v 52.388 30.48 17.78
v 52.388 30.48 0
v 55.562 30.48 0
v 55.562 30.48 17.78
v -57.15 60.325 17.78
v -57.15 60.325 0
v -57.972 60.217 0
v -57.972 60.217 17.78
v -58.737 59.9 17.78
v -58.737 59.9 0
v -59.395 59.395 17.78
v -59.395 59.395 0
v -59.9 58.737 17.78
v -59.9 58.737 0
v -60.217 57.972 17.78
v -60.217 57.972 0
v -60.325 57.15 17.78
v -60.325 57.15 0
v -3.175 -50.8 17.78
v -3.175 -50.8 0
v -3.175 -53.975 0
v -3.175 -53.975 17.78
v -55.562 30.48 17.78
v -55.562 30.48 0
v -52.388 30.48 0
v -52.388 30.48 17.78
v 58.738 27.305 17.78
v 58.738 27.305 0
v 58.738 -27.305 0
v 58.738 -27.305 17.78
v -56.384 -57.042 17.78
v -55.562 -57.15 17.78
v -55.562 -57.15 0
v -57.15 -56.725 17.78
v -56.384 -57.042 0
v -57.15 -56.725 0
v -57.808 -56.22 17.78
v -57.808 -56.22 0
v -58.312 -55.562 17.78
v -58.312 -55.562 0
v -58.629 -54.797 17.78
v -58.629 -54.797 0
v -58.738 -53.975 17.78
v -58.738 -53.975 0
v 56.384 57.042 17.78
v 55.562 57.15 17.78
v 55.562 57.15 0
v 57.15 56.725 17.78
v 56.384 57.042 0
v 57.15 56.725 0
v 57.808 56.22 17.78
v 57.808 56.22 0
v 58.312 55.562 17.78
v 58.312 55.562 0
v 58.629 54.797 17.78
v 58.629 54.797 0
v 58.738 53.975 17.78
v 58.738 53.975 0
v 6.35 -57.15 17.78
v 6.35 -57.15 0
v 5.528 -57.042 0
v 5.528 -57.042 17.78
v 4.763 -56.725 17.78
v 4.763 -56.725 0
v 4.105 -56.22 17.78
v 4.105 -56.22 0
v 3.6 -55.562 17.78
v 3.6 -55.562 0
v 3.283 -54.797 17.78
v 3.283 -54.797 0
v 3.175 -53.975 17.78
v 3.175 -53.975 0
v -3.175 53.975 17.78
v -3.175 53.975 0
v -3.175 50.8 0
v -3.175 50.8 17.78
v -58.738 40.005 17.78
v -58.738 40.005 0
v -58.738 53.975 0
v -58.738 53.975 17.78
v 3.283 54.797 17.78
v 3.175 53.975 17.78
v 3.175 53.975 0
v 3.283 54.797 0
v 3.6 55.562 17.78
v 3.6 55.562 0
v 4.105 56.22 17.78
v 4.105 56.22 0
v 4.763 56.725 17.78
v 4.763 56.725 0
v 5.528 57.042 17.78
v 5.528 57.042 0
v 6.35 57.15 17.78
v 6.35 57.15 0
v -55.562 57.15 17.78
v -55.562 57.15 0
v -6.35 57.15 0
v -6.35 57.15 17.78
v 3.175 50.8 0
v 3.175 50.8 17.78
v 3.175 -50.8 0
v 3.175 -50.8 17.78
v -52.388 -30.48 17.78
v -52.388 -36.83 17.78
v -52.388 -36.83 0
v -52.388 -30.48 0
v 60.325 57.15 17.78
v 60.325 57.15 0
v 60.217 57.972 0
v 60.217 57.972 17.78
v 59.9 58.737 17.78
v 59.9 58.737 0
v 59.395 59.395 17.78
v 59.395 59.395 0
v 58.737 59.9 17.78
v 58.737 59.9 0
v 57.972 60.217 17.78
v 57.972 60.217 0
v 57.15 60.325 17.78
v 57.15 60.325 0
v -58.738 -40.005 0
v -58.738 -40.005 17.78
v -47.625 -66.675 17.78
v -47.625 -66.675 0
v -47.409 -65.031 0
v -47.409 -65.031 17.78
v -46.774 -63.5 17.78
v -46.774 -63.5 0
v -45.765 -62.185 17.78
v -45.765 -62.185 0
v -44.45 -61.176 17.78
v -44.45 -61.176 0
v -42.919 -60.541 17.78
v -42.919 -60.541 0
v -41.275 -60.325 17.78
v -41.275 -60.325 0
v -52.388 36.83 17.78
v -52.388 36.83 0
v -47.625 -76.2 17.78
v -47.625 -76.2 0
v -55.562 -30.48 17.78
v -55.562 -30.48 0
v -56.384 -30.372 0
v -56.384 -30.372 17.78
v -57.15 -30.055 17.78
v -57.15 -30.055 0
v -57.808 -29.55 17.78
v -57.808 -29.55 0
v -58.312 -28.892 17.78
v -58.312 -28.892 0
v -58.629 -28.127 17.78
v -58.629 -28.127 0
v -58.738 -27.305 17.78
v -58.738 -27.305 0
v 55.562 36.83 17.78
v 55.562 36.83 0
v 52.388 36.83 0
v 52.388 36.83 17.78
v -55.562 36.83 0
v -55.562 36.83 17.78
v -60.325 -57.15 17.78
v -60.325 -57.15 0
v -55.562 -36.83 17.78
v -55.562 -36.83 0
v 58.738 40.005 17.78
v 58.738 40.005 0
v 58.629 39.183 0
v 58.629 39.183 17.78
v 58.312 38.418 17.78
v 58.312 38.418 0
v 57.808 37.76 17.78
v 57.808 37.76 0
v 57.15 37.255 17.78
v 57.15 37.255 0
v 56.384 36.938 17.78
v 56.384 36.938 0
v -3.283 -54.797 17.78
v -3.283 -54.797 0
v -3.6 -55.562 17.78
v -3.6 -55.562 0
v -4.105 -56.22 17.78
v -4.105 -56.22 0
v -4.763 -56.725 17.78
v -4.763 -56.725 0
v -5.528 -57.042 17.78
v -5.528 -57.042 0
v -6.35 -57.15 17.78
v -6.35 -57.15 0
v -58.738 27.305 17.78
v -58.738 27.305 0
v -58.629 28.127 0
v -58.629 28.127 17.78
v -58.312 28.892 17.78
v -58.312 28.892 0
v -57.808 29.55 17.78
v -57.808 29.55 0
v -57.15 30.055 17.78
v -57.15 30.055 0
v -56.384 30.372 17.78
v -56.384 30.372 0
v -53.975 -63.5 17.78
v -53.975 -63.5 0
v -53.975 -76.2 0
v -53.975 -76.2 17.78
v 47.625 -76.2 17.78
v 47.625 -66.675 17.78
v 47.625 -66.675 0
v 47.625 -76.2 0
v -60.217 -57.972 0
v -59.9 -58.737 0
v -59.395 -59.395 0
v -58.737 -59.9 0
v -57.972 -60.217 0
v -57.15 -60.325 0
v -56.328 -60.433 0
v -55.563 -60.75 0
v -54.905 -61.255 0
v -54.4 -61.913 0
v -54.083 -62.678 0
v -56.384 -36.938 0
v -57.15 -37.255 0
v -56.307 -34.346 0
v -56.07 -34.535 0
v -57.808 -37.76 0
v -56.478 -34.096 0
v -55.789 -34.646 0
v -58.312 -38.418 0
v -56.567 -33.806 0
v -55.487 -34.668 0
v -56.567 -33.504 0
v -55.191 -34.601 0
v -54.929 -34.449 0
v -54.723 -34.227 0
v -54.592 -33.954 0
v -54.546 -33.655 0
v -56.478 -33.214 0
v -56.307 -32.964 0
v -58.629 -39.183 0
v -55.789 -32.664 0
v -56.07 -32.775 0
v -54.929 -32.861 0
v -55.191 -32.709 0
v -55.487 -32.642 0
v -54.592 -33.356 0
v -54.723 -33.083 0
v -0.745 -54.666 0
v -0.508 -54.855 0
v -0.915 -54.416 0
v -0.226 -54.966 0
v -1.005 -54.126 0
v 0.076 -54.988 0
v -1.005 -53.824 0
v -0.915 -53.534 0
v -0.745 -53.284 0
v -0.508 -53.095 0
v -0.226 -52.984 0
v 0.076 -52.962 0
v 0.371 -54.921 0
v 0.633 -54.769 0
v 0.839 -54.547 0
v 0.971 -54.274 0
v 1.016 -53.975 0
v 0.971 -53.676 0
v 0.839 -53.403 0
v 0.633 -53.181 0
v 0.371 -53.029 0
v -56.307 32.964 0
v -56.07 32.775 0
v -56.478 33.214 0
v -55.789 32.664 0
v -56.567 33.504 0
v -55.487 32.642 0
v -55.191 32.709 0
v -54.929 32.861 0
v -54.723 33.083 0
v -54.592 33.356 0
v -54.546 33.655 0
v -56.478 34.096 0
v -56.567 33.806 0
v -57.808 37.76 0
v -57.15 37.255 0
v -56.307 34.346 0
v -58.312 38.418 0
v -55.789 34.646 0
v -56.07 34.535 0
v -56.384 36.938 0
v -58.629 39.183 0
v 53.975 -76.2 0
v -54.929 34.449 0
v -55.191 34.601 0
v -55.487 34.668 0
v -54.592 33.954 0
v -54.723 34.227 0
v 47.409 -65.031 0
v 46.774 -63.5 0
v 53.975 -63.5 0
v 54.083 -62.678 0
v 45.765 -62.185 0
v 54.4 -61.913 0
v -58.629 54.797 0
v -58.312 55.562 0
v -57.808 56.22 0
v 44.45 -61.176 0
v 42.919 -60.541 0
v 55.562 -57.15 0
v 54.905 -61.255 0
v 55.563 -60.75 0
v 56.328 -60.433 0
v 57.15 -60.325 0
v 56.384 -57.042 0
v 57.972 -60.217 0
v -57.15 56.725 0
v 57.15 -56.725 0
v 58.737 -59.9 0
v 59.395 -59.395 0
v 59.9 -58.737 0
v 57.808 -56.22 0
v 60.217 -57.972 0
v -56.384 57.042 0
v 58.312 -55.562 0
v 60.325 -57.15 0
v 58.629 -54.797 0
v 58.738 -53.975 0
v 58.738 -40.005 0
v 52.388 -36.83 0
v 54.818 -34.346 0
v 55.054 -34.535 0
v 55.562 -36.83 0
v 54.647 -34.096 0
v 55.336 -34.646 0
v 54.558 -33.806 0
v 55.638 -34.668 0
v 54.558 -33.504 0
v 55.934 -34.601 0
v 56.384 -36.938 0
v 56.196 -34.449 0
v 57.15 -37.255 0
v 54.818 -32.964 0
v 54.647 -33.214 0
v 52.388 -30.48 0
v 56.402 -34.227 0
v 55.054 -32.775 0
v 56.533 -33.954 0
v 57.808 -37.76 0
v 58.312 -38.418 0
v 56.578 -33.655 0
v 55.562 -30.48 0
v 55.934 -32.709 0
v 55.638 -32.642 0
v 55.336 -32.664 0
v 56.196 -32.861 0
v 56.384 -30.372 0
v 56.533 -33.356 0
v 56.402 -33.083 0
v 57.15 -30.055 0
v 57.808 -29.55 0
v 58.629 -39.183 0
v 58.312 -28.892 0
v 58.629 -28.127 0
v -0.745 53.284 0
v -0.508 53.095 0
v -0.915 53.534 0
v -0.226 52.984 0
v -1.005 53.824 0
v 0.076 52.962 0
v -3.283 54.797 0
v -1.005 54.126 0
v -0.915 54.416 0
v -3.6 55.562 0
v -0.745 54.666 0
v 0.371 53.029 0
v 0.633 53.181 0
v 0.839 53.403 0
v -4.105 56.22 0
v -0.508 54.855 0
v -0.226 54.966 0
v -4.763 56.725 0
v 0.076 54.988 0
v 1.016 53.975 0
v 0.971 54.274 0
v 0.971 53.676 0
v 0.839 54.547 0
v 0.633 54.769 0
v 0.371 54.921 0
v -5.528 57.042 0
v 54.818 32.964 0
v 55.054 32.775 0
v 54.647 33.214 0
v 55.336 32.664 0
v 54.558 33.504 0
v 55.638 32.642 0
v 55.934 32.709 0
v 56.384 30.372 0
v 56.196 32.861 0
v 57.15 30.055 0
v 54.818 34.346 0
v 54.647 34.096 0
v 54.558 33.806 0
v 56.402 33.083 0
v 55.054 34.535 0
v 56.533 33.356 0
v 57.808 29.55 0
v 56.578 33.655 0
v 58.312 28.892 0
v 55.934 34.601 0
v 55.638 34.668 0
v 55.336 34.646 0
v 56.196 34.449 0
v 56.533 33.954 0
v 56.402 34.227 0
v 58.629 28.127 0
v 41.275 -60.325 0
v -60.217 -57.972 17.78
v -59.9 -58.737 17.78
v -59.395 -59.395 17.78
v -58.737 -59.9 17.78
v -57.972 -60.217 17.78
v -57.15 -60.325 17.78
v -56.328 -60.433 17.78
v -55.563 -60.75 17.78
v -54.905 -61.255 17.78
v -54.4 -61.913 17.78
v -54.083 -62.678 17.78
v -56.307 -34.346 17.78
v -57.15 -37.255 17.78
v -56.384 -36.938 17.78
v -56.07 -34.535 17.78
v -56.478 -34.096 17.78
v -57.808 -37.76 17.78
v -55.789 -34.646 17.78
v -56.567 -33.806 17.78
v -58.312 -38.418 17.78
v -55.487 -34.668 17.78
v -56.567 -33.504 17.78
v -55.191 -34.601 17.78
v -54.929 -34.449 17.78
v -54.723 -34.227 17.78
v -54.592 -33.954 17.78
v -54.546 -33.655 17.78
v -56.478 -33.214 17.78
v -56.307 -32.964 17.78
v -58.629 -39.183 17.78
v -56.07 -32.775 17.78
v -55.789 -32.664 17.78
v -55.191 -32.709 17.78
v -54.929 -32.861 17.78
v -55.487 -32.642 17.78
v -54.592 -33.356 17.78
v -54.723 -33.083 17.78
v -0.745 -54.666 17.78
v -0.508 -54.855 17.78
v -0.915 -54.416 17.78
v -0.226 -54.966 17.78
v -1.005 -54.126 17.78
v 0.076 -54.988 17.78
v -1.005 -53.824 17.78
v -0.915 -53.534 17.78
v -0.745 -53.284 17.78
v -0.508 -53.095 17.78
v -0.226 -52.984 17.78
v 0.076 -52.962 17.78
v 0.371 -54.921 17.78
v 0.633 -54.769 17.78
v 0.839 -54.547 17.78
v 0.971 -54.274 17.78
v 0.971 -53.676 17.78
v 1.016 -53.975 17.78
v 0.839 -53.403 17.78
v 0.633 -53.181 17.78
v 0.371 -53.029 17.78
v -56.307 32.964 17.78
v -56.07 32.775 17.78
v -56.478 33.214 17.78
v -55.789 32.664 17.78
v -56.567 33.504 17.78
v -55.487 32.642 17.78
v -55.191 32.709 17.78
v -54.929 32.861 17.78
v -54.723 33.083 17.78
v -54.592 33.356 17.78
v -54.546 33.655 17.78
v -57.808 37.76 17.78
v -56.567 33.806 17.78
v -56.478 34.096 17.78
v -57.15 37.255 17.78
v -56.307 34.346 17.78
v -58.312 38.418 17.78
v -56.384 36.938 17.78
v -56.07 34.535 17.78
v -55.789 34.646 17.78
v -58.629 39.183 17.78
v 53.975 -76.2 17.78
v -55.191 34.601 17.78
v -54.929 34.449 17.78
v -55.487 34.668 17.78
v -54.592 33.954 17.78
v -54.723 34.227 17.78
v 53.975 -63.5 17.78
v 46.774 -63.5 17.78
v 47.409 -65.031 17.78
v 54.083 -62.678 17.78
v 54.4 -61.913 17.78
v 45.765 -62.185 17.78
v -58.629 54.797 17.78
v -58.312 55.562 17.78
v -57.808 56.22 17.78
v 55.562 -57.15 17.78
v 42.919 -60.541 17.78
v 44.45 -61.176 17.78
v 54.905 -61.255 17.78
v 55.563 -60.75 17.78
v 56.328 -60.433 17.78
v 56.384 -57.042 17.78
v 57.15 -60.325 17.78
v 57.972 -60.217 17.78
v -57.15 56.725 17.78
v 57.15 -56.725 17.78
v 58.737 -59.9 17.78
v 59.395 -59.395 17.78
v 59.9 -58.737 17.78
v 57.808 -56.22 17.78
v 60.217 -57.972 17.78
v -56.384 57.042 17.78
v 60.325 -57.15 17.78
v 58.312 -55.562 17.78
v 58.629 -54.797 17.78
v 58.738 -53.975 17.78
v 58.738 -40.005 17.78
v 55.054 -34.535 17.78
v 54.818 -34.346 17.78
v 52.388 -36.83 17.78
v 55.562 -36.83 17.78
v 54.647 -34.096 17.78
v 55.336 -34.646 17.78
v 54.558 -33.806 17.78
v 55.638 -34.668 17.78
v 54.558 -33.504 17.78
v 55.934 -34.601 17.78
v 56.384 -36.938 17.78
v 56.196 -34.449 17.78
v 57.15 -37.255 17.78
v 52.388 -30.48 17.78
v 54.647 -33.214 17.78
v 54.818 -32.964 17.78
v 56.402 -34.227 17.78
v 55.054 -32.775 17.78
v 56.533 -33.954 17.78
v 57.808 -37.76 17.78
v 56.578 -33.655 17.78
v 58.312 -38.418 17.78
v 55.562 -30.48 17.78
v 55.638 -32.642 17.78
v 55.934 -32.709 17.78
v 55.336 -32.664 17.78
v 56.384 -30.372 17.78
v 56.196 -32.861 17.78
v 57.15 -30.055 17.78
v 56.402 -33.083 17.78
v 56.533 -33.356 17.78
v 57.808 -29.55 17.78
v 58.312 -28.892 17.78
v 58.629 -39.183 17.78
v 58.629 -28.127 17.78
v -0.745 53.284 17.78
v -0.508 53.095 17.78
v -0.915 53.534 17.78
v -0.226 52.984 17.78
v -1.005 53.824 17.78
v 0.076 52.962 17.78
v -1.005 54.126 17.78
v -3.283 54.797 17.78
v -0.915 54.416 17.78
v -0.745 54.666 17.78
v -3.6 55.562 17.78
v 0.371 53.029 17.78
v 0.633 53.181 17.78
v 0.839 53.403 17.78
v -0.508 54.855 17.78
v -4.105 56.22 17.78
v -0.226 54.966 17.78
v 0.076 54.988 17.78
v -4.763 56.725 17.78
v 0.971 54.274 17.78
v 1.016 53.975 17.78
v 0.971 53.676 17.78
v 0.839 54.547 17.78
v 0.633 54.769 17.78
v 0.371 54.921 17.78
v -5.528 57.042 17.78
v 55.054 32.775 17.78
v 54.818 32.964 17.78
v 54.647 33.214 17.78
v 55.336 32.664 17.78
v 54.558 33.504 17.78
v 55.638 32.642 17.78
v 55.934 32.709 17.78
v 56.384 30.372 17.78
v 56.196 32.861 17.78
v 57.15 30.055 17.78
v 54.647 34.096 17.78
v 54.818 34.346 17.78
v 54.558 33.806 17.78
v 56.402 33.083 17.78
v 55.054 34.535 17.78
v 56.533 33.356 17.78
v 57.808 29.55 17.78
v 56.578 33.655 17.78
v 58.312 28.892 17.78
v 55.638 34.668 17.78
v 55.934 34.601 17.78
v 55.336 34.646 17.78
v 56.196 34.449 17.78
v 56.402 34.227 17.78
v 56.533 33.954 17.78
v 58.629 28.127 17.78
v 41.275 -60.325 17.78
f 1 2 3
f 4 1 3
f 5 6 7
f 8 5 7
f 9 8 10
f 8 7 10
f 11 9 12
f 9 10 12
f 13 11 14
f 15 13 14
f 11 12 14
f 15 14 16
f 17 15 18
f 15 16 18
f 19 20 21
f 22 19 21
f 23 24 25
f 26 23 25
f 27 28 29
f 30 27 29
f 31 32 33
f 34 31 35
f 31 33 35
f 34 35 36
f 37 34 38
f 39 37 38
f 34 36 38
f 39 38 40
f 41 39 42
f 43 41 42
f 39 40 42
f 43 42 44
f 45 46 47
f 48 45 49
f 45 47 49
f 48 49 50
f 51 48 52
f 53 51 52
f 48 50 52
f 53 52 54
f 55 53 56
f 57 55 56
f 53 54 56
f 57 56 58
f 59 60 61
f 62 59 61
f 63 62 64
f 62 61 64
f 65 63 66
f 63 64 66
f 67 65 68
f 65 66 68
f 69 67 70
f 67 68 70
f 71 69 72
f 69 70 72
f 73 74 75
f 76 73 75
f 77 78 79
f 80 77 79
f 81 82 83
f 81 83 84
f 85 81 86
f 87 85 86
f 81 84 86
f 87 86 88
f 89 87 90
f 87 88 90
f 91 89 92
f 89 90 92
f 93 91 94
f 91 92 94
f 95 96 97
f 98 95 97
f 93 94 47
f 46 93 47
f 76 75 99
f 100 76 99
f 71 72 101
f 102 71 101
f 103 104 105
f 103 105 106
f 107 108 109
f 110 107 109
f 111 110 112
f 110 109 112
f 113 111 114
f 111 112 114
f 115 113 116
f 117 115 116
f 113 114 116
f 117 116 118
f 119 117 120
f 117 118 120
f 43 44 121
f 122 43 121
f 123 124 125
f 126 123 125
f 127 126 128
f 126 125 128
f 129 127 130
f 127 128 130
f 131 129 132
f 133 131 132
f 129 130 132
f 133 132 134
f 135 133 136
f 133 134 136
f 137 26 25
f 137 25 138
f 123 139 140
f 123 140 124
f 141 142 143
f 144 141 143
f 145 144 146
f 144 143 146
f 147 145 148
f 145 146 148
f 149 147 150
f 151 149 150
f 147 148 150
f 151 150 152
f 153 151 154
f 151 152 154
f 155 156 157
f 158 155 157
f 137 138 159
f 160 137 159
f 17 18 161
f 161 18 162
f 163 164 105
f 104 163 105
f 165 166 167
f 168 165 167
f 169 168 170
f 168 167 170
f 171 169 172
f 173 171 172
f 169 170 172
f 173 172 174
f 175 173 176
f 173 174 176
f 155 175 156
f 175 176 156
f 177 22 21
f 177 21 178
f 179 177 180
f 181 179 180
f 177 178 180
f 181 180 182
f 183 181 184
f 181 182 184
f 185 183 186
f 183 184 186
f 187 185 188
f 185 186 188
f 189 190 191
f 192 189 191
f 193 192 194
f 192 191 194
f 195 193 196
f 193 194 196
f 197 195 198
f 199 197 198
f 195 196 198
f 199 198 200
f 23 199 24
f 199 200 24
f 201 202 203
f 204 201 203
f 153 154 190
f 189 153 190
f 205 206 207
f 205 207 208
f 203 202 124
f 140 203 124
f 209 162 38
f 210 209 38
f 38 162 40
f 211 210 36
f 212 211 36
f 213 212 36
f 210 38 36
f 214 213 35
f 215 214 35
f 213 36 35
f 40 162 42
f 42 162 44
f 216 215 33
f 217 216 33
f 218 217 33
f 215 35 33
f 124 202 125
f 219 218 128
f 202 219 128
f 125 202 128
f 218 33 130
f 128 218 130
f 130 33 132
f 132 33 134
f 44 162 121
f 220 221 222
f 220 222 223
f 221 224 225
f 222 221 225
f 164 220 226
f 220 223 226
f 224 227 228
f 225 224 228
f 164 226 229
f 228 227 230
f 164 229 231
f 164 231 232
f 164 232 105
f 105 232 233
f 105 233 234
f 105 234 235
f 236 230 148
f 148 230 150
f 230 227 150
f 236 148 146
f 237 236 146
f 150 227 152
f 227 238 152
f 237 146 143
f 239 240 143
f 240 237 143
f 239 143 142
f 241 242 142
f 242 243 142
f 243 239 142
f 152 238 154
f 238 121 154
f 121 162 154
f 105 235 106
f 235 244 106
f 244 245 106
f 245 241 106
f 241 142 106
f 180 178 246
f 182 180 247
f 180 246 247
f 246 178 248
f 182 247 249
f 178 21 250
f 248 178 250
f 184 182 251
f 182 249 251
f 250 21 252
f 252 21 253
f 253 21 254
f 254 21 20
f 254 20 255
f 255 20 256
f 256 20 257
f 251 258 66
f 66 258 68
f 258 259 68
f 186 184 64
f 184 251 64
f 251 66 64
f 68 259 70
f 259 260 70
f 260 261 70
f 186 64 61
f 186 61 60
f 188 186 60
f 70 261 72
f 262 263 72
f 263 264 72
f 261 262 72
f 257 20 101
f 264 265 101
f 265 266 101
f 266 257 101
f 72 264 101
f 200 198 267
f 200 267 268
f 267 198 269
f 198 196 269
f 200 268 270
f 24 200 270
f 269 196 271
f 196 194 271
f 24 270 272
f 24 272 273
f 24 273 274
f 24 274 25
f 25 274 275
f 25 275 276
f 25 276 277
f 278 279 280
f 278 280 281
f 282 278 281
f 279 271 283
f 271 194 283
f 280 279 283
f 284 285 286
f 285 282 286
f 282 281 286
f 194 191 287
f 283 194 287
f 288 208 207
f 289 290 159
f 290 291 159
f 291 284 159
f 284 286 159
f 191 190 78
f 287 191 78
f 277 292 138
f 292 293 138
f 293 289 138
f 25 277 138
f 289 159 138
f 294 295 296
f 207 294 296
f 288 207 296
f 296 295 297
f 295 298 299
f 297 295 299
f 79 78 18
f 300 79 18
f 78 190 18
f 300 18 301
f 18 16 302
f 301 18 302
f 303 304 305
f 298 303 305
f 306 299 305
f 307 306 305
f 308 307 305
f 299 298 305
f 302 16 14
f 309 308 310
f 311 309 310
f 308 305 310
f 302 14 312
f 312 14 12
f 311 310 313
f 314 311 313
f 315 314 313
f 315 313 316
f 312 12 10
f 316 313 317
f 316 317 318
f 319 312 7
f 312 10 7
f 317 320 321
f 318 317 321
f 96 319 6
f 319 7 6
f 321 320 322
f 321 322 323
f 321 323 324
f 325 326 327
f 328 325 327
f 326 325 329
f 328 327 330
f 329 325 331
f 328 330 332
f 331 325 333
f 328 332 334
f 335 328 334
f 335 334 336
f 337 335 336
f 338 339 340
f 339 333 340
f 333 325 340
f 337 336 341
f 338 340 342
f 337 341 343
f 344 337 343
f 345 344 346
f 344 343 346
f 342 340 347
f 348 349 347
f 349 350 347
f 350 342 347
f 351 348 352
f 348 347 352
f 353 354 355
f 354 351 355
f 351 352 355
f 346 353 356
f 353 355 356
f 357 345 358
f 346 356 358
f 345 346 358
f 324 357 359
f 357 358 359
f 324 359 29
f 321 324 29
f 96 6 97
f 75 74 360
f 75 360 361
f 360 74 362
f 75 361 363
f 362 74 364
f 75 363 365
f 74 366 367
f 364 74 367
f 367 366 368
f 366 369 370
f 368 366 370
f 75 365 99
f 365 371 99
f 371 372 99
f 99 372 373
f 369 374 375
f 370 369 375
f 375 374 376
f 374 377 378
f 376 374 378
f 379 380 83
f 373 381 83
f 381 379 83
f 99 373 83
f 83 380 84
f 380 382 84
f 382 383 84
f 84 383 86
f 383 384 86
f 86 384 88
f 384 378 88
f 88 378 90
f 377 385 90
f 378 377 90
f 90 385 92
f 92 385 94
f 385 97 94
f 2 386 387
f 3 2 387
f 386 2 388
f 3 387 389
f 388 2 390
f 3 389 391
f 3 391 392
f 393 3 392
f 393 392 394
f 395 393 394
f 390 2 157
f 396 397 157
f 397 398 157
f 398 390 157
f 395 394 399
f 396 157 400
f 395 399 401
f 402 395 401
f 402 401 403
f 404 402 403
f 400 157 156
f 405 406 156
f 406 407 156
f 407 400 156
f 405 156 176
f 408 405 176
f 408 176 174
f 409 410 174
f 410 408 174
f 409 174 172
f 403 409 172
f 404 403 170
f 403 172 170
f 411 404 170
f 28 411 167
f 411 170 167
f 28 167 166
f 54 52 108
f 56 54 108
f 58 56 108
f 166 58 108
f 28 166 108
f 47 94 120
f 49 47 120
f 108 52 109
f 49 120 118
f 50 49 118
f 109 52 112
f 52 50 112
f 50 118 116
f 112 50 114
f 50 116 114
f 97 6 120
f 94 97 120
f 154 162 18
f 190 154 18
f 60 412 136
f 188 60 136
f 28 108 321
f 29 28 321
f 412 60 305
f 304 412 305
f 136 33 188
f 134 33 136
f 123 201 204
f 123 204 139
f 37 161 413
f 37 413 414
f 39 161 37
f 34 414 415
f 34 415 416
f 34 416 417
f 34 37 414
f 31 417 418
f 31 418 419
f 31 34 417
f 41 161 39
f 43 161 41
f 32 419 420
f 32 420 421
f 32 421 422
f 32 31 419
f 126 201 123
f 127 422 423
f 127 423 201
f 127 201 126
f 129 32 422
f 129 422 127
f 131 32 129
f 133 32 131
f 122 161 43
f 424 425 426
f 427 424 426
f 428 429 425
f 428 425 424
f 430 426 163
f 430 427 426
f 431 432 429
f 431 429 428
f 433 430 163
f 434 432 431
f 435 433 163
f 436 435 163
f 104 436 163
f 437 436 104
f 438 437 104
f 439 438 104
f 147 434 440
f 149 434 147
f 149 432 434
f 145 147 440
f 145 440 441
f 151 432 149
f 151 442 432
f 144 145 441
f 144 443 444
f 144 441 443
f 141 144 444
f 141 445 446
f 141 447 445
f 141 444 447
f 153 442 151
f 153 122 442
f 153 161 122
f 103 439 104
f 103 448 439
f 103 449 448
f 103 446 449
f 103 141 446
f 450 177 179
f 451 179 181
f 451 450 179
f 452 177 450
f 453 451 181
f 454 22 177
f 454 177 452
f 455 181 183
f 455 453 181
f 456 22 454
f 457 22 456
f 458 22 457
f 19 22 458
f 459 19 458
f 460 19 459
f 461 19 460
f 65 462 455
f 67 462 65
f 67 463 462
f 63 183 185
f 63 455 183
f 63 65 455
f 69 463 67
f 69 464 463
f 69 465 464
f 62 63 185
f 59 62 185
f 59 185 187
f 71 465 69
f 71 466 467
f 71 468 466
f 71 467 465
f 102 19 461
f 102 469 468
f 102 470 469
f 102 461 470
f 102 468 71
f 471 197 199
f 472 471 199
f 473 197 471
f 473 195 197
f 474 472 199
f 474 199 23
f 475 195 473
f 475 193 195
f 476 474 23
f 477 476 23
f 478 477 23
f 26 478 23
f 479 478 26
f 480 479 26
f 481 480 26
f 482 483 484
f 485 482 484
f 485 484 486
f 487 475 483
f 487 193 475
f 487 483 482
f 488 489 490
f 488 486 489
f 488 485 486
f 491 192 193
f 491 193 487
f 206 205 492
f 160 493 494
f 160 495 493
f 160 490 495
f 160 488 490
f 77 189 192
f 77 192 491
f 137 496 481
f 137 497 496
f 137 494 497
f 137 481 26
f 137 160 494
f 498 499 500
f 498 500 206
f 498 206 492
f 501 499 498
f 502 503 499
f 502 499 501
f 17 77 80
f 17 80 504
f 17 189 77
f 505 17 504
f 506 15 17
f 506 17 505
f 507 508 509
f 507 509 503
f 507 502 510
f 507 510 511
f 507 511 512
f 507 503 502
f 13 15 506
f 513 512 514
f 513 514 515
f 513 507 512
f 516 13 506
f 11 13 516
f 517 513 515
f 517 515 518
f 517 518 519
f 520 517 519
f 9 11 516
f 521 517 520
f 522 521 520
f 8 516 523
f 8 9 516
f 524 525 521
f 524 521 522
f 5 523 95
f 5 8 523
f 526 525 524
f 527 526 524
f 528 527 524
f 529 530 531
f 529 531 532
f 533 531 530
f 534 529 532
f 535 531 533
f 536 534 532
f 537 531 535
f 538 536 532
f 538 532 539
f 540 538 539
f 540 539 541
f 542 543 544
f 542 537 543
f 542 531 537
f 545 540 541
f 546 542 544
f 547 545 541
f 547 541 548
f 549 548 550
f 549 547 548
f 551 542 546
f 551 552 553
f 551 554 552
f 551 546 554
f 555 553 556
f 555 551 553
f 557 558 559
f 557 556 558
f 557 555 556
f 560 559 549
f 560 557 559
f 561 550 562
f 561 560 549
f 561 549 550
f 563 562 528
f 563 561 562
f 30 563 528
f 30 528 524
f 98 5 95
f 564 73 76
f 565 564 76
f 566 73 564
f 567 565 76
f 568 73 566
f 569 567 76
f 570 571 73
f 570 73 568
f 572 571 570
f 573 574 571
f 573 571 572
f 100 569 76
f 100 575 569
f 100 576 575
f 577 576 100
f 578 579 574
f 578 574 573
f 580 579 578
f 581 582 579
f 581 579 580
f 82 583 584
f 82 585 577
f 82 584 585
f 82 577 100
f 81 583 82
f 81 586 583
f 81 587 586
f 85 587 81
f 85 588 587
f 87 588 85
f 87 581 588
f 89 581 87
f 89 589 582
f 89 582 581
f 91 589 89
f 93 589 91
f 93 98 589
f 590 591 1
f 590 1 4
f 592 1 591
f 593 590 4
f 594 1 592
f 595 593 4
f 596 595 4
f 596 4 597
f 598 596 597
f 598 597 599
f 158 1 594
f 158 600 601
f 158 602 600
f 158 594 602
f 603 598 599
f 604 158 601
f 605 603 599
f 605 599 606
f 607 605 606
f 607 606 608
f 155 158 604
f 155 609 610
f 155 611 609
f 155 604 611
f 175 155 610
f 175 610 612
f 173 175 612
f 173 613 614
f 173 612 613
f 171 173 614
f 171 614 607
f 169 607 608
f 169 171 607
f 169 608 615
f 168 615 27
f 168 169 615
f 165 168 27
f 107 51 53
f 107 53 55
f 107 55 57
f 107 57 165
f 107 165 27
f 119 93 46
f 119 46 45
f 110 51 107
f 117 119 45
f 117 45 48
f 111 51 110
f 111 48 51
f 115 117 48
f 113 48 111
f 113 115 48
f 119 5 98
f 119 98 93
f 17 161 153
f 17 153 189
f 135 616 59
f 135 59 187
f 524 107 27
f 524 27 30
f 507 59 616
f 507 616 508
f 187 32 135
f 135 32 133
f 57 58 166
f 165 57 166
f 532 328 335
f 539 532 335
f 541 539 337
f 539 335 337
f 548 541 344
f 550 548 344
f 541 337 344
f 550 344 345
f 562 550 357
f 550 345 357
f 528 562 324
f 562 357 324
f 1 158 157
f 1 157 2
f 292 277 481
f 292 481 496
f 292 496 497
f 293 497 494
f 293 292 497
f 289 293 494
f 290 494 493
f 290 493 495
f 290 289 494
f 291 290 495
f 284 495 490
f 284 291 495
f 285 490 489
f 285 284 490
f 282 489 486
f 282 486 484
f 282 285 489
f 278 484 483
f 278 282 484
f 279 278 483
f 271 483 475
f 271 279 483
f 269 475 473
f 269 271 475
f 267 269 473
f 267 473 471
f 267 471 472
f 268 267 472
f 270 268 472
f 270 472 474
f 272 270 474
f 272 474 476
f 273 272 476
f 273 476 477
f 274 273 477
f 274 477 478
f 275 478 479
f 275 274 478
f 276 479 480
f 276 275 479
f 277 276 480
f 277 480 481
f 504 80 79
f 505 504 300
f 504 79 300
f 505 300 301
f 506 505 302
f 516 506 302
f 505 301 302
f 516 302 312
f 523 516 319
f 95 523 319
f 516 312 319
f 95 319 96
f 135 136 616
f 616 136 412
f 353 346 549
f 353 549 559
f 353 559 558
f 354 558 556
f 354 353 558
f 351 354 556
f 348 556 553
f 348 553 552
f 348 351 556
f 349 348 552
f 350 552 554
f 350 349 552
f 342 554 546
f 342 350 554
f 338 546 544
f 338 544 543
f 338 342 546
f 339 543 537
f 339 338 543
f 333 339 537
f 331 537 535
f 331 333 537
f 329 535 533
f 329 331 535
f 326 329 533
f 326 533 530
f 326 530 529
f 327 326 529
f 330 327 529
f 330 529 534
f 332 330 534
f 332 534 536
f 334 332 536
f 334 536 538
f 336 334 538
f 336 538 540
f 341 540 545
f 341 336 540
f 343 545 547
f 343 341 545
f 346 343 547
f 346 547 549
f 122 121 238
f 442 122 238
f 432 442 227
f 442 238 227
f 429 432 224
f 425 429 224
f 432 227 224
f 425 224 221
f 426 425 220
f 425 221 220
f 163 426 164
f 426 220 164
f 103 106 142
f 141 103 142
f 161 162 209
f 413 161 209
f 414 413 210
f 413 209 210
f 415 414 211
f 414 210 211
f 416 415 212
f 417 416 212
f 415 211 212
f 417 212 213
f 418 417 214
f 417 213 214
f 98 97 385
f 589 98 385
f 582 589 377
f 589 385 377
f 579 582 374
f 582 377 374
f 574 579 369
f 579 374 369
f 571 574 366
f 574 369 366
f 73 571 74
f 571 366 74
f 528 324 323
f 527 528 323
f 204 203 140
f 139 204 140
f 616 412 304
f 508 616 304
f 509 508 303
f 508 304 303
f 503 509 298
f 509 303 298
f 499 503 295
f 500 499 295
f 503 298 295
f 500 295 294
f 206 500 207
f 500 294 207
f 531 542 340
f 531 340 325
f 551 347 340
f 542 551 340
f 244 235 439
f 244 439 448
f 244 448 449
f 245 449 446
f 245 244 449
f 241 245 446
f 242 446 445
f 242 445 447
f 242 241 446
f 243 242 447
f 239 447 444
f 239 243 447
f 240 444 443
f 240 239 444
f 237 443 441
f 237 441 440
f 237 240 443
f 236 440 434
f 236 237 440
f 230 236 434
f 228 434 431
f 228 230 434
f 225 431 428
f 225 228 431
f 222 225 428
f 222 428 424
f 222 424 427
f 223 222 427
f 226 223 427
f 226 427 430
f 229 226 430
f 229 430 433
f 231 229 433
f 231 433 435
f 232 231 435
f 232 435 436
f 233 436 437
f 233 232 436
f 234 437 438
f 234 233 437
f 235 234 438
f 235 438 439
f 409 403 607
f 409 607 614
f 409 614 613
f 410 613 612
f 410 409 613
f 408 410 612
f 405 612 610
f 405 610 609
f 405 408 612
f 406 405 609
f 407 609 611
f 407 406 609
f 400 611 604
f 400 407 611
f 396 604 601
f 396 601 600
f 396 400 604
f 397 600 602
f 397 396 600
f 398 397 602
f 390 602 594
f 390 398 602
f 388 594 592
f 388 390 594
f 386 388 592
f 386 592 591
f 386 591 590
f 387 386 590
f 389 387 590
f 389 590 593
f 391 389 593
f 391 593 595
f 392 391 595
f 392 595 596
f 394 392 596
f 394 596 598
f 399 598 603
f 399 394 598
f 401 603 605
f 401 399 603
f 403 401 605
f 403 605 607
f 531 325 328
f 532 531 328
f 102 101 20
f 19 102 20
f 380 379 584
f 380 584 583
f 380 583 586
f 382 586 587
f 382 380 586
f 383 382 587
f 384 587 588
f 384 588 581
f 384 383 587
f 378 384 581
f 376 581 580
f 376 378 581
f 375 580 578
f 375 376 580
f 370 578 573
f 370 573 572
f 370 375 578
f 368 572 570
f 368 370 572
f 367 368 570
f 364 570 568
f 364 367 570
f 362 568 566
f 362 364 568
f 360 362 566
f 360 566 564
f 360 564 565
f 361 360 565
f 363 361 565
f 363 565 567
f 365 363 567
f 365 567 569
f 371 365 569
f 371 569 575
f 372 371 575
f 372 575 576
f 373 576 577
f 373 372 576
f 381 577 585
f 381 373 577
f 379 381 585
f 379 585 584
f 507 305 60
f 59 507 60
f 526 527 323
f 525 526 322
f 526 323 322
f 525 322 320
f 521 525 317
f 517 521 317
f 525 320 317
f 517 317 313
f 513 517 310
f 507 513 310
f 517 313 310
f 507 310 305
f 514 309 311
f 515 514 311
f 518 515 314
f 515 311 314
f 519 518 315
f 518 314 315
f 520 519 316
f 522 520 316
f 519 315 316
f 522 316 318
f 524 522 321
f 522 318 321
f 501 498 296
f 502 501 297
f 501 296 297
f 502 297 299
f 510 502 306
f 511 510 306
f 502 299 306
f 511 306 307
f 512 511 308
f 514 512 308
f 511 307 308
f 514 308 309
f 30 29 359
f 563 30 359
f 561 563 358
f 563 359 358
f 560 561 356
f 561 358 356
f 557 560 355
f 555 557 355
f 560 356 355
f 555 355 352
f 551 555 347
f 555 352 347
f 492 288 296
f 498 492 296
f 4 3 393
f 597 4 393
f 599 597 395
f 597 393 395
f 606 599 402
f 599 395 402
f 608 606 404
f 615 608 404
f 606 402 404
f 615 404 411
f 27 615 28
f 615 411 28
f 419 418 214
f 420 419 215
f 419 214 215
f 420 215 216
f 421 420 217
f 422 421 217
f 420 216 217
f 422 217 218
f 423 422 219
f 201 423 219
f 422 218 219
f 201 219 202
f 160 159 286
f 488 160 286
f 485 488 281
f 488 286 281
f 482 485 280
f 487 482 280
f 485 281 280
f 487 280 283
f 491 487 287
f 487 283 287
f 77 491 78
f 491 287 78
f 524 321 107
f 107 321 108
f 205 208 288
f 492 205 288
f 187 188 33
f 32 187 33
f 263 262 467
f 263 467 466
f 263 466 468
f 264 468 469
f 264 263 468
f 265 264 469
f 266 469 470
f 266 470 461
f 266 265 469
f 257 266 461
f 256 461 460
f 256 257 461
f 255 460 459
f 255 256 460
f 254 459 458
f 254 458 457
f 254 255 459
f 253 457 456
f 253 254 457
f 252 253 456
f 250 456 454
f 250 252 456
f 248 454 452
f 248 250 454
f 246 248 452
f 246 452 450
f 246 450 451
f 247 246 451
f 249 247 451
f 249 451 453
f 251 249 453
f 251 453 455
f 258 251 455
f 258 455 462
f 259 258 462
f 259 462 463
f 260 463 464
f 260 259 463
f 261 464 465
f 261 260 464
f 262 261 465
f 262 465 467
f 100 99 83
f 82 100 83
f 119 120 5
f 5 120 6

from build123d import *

# Parameters (mm, degrees)
F0_R     = 1.016
F1_DEPTH = 17.78


with BuildPart() as f1:
    # F0 (on Top) → F1 (new body)
    with BuildSketch(Plane.XY):
        with BuildLine():
            Line((57.15, 60.325), (-57.15, 60.325))
            ThreePointArc((-57.15, 60.325), (-59.395064, 59.395064), (-60.325, 57.15))
            Line((-60.325, 57.15), (-60.325, -57.15))
            ThreePointArc((-60.325, -57.15), (-59.395064, -59.395064), (-57.15, -60.325))
            ThreePointArc((-57.15, -60.325), (-54.904936, -61.254936), (-53.975, -63.5))
            Line((-53.975, -63.5), (-53.975, -76.2))
            Line((-53.975, -76.2), (-47.625, -76.2))
            Line((-47.625, -76.2), (-47.625, -66.675))
            ThreePointArc((-47.625, -66.675), (-45.765128, -62.184872), (-41.275, -60.325))
            Line((-41.275, -60.325), (41.275, -60.325))
            ThreePointArc((41.275, -60.325), (45.765128, -62.184872), (47.625, -66.675))
            Line((47.625, -66.675), (47.625, -76.2))
            Line((47.625, -76.2), (53.975, -76.2))
            Line((53.975, -76.2), (53.975, -63.5))
            ThreePointArc((53.975, -63.5), (54.904936, -61.254936), (57.15, -60.325))
            ThreePointArc((57.15, -60.325), (59.395064, -59.395064), (60.325, -57.15))
            Line((60.325, -57.15), (60.325, 57.15))
            ThreePointArc((60.325, 57.15), (59.395064, 59.395064), (57.15, 60.325))
        make_face()
        with Locations((-55.5625, -33.655)):
            Circle(F0_R, mode=Mode.SUBTRACT)
        with Locations((0, -53.975)):
            Circle(F0_R, mode=Mode.SUBTRACT)
        with Locations((55.5625, -33.655)):
            Circle(F0_R, mode=Mode.SUBTRACT)
        with Locations((-55.5625, 33.655)):
            Circle(F0_R, mode=Mode.SUBTRACT)
        with BuildLine():
            ThreePointArc((-58.7375, 53.975), (-57.807564, 56.220064), (-55.5625, 57.15))
            Line((-55.5625, 57.15), (-6.35, 57.15))
            ThreePointArc((-6.35, 57.15), (-4.104936, 56.220064), (-3.175, 53.975))
            Line((-3.175, 53.975), (-3.175, 50.8))
            Line((-3.175, 50.8), (3.175, 50.8))
            Line((3.175, 50.8), (3.175, 53.975))
            ThreePointArc((3.175, 53.975), (4.104936, 56.220064), (6.35, 57.15))
            Line((6.35, 57.15), (55.5625, 57.15))
            ThreePointArc((55.5625, 57.15), (57.807564, 56.220064), (58.7375, 53.975))
            Line((58.7375, 53.975), (58.7375, 40.005))
            ThreePointArc((58.7375, 40.005), (57.807564, 37.759936), (55.5625, 36.83))
            Line((55.5625, 36.83), (52.3875, 36.83))
            Line((52.3875, 36.83), (52.3875, 30.48))
            Line((52.3875, 30.48), (55.5625, 30.48))
            ThreePointArc((55.5625, 30.48), (57.807564, 29.550064), (58.7375, 27.305))
            Line((58.7375, 27.305), (58.7375, -27.305))
            ThreePointArc((58.7375, -27.305), (57.807564, -29.550064), (55.5625, -30.48))
            Line((55.5625, -30.48), (52.3875, -30.48))
            Line((52.3875, -30.48), (52.3875, -36.83))
            Line((52.3875, -36.83), (55.5625, -36.83))
            ThreePointArc((55.5625, -36.83), (57.807564, -37.759936), (58.7375, -40.005))
            Line((58.7375, -40.005), (58.7375, -53.975))
            ThreePointArc((58.7375, -53.975), (57.807564, -56.220064), (55.5625, -57.15))
            Line((55.5625, -57.15), (6.35, -57.15))
            ThreePointArc((6.35, -57.15), (4.104936, -56.220064), (3.175, -53.975))
            Line((3.175, -53.975), (3.175, -50.8))
            Line((3.175, -50.8), (-3.175, -50.8))
            Line((-3.175, -50.8), (-3.175, -53.975))
            ThreePointArc((-3.175, -53.975), (-4.104936, -56.220064), (-6.35, -57.15))
            Line((-6.35, -57.15), (-55.5625, -57.15))
            ThreePointArc((-55.5625, -57.15), (-57.807564, -56.220064), (-58.7375, -53.975))
            Line((-58.7375, -53.975), (-58.7375, -40.005))
            ThreePointArc((-58.7375, -40.005), (-57.807564, -37.759936), (-55.5625, -36.83))
            Line((-55.5625, -36.83), (-52.3875, -36.83))
            Line((-52.3875, -36.83), (-52.3875, -30.48))
            Line((-52.3875, -30.48), (-55.5625, -30.48))
            ThreePointArc((-55.5625, -30.48), (-57.807564, -29.550064), (-58.7375, -27.305))
            Line((-58.7375, -27.305), (-58.7375, 27.305))
            ThreePointArc((-58.7375, 27.305), (-57.807564, 29.550064), (-55.5625, 30.48))
            Line((-55.5625, 30.48), (-52.3875, 30.48))
            Line((-52.3875, 30.48), (-52.3875, 36.83))
            Line((-52.3875, 36.83), (-55.5625, 36.83))
            ThreePointArc((-55.5625, 36.83), (-57.807564, 37.759936), (-58.7375, 40.005))
            Line((-58.7375, 40.005), (-58.7375, 53.975))
        make_face(mode=Mode.SUBTRACT)
        with Locations((0, 53.975)):
            Circle(F0_R, mode=Mode.SUBTRACT)
        with Locations((55.5625, 33.655)):
            Circle(F0_R, mode=Mode.SUBTRACT)
    extrude(amount=F1_DEPTH)


solid = f1.part
